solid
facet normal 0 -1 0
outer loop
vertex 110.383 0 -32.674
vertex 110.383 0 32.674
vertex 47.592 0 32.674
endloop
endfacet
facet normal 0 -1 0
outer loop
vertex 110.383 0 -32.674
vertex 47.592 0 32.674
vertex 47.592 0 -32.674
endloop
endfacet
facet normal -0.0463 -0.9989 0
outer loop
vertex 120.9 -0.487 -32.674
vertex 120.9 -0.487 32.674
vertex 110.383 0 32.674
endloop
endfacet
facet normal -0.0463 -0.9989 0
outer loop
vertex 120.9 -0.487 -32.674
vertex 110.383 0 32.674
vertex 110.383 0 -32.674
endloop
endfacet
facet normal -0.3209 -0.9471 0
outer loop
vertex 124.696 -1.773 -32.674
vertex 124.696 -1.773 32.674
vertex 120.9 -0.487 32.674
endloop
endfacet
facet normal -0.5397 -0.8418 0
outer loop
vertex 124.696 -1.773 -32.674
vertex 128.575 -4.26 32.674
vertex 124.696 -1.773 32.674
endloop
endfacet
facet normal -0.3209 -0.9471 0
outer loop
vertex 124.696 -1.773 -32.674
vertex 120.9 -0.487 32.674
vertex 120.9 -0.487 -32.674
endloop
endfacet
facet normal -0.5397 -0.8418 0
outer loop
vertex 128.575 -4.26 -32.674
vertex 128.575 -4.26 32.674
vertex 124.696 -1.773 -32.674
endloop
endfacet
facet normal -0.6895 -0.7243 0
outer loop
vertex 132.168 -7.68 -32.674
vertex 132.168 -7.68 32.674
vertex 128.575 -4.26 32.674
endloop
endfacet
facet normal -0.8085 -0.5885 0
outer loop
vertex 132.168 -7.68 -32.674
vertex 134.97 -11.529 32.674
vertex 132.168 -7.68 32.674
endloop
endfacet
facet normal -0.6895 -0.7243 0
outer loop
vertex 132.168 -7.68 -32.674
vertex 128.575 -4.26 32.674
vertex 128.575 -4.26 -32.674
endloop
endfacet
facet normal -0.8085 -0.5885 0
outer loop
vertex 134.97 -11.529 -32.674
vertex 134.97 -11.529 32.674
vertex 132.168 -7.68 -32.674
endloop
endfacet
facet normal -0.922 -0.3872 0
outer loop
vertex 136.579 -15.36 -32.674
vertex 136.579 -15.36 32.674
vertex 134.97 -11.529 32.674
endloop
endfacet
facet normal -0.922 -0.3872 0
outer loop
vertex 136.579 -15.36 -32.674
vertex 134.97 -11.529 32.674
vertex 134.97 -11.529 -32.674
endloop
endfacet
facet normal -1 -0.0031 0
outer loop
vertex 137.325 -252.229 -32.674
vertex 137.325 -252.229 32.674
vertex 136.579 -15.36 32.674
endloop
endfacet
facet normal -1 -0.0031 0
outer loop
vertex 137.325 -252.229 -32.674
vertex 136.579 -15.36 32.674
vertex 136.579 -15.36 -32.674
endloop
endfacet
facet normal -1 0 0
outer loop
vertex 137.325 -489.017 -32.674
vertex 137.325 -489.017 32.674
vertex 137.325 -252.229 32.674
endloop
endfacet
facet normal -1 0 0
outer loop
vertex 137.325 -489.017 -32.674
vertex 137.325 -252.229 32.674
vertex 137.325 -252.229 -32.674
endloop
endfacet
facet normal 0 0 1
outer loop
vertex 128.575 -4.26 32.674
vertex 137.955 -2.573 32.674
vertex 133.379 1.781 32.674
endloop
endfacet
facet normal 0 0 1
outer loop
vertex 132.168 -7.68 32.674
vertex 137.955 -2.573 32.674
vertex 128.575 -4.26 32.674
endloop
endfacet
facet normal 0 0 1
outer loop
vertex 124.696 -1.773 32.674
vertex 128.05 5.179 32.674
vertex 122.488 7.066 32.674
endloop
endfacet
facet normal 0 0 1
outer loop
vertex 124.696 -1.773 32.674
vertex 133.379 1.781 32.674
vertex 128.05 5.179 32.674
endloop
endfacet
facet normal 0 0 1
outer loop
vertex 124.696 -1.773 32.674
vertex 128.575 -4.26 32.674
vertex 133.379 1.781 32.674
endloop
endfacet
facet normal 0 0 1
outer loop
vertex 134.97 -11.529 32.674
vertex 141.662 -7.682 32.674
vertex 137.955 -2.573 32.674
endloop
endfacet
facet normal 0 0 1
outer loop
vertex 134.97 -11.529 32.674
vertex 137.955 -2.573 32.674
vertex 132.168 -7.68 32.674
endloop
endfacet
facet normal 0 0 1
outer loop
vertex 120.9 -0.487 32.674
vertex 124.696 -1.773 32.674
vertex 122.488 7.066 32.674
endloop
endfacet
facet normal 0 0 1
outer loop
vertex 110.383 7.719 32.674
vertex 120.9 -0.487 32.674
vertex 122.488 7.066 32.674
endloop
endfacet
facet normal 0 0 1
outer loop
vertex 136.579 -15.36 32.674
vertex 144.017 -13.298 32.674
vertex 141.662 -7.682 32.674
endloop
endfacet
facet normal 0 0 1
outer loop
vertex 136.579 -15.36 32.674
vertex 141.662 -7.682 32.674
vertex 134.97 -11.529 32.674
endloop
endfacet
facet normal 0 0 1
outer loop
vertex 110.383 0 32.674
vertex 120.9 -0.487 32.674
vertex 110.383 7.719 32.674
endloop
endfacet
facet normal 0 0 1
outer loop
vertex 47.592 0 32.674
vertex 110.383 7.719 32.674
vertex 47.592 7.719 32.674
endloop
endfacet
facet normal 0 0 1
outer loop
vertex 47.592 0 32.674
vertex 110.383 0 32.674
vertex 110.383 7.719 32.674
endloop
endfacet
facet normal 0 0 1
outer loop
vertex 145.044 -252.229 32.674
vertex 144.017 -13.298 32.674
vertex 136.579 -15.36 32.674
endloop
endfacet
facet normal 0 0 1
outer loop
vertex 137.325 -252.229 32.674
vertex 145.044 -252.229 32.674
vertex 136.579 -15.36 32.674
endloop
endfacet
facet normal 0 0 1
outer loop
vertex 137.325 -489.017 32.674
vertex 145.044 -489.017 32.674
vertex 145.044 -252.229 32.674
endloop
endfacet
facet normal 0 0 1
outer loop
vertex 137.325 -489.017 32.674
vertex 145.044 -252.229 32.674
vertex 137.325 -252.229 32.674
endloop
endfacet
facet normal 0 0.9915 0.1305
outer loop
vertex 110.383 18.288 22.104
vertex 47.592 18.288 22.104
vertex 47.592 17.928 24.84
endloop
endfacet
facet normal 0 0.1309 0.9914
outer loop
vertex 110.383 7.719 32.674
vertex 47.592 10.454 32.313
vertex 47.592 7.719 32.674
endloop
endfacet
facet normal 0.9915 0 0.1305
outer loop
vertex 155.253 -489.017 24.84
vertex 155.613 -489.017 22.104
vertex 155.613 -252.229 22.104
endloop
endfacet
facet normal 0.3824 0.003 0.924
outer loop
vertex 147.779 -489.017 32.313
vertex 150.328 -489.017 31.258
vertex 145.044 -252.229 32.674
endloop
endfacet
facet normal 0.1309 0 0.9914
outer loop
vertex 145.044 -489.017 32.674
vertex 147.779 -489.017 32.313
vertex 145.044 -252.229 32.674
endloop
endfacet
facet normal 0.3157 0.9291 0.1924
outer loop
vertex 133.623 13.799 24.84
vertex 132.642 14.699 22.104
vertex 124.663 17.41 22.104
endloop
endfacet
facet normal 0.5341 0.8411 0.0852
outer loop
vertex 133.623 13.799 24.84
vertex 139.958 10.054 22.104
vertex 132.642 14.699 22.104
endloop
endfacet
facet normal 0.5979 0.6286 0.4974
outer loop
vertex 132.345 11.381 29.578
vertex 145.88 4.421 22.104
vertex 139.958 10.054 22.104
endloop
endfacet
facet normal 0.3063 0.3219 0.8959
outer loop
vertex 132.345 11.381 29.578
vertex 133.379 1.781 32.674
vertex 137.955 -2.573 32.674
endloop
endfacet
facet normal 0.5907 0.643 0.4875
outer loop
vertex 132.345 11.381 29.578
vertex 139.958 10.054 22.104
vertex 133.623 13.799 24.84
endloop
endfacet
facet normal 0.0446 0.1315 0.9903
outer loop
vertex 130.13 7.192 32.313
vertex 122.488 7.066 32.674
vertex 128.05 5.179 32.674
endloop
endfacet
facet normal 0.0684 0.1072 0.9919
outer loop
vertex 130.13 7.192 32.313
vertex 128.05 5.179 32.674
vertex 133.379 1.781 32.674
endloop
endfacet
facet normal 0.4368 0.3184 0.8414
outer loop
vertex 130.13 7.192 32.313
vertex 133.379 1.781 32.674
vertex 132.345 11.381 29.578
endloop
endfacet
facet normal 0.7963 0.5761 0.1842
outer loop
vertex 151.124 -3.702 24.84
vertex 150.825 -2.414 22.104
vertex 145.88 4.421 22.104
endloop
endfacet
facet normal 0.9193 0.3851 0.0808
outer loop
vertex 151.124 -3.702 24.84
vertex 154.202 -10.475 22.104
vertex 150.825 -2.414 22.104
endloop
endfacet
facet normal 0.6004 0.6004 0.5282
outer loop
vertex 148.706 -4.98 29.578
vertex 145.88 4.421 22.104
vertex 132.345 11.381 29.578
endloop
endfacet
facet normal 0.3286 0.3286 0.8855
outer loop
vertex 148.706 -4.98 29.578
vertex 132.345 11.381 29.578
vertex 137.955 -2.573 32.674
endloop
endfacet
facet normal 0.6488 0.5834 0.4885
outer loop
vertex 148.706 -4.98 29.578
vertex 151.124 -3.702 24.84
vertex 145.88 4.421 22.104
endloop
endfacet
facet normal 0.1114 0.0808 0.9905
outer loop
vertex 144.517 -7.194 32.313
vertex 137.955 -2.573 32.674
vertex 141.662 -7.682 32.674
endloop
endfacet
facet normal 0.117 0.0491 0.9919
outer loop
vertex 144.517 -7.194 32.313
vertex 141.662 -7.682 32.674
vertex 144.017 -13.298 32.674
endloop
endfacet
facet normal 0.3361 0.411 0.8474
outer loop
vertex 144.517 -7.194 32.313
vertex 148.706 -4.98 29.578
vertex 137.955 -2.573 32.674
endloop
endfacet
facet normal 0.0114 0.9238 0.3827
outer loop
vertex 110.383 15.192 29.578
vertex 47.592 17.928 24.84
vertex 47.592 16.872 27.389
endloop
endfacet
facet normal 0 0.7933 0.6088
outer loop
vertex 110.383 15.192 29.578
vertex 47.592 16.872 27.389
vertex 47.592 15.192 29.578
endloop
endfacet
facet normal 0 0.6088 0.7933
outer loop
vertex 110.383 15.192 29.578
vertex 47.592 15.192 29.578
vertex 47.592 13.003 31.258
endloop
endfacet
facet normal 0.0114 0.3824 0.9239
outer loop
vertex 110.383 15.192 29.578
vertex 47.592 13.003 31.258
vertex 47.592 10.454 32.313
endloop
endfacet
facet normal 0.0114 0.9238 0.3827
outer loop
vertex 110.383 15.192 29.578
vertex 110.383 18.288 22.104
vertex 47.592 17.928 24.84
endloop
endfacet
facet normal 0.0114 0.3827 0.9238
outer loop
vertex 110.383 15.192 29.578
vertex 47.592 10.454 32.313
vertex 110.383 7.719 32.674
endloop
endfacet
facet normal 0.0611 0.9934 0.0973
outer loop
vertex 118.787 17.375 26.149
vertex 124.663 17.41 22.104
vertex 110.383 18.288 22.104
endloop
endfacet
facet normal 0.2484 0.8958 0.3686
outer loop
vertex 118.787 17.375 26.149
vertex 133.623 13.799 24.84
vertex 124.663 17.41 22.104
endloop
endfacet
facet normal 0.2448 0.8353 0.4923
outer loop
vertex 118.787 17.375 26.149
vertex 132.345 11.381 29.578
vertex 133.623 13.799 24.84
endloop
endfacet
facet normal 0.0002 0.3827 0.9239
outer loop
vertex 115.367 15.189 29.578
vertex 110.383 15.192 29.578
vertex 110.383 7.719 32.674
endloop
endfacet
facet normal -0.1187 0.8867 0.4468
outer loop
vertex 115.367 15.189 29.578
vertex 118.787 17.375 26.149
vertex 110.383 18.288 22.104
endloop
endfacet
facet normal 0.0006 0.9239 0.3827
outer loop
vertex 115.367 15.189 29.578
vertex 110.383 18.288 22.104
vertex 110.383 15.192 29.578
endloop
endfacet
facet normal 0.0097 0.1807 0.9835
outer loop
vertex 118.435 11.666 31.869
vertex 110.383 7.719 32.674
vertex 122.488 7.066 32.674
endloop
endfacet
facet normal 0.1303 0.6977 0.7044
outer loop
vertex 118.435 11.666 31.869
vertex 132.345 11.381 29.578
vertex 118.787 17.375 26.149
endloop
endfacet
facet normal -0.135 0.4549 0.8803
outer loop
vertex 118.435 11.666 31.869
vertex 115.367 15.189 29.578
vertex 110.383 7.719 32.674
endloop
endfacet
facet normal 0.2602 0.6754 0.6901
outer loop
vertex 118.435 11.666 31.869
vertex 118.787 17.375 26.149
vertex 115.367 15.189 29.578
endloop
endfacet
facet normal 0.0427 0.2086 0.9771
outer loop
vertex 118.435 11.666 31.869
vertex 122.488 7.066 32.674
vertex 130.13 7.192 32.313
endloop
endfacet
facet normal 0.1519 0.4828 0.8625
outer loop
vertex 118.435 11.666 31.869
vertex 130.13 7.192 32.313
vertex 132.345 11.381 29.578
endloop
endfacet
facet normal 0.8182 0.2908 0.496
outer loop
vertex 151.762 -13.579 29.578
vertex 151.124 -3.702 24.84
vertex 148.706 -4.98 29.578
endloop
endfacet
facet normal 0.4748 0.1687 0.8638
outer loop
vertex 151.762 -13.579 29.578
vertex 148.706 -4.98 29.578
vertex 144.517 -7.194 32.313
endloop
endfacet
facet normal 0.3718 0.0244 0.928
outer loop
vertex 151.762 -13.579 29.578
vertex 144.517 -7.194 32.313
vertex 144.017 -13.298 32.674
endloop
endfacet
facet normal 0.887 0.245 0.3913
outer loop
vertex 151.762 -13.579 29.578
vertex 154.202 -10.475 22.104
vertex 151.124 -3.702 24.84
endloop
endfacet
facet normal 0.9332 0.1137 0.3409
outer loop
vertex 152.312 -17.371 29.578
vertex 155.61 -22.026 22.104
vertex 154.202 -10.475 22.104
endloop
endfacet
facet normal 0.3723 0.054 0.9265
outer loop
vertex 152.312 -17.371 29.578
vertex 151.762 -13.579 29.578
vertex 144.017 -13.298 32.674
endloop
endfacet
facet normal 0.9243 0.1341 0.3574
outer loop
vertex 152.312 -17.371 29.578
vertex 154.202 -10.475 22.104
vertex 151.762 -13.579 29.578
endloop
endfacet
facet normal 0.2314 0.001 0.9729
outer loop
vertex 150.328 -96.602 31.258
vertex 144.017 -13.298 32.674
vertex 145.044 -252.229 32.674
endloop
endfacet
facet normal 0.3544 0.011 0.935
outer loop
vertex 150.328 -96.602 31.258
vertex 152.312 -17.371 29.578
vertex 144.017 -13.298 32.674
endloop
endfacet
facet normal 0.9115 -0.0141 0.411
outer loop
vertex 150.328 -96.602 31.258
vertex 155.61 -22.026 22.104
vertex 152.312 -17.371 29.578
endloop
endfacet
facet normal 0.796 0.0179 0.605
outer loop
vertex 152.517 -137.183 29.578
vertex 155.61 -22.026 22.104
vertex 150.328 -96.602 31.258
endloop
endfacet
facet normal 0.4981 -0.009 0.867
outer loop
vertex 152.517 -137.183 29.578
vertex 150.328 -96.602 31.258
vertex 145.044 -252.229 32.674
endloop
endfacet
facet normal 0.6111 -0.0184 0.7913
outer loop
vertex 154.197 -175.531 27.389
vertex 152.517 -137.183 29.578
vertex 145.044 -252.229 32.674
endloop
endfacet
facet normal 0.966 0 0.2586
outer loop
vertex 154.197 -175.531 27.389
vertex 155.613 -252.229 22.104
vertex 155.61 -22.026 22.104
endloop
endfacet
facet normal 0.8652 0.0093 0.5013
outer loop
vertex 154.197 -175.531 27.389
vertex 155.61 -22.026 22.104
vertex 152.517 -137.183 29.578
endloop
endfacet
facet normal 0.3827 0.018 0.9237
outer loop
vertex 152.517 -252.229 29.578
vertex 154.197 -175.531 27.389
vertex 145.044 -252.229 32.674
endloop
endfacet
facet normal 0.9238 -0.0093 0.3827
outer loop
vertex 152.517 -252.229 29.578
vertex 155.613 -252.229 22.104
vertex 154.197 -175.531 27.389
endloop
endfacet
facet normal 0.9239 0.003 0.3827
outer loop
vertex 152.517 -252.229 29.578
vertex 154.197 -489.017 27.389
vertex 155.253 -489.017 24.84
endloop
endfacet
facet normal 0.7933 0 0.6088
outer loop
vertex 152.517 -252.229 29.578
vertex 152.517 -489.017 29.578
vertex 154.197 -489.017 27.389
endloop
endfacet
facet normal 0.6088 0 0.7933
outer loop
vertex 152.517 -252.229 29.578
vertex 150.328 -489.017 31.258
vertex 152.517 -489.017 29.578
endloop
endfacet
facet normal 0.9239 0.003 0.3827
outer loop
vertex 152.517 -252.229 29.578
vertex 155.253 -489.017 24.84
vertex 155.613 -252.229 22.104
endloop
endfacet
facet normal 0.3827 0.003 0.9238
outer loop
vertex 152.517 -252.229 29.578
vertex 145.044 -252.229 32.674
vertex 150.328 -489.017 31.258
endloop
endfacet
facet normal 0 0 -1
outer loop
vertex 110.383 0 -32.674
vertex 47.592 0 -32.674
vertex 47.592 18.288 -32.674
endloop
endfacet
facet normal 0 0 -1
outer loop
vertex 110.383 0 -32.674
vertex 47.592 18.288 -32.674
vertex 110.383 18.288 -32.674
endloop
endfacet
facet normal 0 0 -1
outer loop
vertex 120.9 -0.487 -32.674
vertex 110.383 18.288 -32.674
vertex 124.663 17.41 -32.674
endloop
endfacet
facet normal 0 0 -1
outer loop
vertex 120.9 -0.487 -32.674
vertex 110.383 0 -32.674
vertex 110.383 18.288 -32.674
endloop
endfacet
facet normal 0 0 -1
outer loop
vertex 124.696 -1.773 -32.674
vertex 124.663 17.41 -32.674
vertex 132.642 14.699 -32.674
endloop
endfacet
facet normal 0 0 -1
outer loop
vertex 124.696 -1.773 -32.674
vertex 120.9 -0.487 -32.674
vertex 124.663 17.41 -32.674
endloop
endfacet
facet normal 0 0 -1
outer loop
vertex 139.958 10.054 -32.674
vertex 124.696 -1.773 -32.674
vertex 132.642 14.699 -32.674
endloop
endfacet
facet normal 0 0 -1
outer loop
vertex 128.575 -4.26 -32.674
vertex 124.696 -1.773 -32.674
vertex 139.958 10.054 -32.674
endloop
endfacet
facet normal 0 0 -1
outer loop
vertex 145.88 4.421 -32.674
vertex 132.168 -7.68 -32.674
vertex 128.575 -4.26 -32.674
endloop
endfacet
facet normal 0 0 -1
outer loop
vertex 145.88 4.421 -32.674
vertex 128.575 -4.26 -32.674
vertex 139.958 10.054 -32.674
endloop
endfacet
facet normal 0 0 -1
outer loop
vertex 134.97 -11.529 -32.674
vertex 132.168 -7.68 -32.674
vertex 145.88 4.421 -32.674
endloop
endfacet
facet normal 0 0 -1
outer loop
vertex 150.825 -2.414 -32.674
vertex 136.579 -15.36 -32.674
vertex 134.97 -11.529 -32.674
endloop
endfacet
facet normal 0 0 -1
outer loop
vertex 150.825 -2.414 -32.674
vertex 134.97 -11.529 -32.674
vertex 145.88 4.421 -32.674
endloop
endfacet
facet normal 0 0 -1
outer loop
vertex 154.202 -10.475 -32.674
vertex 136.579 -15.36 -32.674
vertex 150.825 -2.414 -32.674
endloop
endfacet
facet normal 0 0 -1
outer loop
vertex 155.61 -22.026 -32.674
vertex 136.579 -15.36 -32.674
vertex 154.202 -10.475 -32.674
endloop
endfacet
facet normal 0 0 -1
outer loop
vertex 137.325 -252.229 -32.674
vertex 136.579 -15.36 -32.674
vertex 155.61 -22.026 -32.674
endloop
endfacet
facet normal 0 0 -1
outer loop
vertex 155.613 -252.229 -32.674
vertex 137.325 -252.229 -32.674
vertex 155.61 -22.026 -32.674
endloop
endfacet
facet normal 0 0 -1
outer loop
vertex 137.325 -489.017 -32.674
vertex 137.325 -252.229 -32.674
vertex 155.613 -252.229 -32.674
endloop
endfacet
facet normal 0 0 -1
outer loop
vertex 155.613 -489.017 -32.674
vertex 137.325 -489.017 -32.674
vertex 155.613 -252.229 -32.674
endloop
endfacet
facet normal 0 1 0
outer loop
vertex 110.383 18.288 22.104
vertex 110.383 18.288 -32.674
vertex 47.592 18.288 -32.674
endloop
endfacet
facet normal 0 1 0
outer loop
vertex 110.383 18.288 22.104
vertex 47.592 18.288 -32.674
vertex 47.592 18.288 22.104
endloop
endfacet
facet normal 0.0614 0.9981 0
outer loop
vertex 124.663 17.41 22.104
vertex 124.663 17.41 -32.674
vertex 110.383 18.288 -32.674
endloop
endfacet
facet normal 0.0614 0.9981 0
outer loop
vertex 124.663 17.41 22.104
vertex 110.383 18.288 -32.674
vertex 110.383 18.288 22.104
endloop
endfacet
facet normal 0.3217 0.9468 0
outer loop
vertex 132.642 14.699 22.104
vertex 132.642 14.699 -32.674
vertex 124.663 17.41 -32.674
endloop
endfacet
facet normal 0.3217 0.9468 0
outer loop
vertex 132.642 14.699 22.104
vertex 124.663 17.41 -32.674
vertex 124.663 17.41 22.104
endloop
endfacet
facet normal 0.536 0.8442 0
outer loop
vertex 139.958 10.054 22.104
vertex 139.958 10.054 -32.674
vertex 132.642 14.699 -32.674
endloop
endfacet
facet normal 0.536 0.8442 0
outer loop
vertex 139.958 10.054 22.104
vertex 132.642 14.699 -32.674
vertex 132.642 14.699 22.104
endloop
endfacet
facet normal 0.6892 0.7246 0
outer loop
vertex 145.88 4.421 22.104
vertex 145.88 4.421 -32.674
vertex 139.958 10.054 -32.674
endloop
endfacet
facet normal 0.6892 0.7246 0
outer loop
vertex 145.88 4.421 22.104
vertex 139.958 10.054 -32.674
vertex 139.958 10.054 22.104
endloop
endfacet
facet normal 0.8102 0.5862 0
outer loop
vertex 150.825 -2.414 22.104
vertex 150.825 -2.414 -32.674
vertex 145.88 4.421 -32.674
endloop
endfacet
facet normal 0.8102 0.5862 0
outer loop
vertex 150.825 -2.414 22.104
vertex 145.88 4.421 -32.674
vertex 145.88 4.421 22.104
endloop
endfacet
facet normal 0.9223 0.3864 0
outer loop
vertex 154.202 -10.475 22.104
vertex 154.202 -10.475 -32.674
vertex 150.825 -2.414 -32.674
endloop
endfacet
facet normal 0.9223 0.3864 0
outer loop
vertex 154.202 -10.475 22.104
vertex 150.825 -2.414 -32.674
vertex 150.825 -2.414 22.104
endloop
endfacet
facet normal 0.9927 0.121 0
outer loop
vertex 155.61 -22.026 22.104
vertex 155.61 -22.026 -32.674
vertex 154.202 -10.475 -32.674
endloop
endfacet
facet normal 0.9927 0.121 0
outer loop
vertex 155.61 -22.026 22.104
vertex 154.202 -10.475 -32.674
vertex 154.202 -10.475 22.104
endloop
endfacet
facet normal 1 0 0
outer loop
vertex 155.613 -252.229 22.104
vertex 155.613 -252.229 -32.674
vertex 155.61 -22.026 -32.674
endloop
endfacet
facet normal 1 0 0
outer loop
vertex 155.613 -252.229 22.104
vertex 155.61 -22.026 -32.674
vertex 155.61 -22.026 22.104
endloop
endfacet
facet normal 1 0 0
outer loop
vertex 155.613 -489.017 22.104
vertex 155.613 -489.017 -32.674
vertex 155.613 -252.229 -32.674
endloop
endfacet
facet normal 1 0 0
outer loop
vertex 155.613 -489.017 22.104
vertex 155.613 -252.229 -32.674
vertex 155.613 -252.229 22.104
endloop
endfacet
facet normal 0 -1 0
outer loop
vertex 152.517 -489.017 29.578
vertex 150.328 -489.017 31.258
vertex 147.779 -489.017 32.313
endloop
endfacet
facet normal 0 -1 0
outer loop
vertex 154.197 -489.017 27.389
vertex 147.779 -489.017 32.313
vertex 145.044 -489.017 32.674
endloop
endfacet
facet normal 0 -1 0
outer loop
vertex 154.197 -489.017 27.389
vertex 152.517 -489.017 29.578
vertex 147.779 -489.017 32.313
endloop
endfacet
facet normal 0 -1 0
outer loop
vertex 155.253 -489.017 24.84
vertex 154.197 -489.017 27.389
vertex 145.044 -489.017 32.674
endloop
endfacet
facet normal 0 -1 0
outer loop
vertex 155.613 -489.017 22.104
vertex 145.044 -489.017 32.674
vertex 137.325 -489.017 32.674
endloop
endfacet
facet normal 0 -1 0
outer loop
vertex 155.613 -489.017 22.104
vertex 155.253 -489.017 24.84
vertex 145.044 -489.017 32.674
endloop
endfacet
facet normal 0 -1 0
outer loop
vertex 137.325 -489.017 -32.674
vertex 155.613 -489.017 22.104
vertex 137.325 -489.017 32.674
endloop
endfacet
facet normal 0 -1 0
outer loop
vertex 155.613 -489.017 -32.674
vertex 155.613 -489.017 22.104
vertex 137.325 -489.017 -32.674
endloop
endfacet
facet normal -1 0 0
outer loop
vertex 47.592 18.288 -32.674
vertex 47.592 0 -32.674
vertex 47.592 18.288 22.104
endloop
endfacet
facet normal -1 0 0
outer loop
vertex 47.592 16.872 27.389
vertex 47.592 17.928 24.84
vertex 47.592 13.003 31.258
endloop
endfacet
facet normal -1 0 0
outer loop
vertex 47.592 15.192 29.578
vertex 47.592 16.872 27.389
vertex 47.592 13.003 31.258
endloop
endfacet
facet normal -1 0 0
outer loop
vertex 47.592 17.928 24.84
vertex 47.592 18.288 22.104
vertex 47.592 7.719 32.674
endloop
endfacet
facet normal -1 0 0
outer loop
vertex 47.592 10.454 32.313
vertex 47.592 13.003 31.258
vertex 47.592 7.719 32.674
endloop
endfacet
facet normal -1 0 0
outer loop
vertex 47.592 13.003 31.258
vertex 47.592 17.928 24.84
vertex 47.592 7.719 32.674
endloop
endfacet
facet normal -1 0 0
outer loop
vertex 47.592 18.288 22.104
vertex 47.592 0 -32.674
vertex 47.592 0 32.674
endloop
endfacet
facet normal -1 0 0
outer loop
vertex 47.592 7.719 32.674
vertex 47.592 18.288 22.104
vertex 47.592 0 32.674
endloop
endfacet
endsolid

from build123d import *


with BuildPart() as part:
    # Sweep1: sweep along a path in Sketch4
    with BuildLine() as sweep1_path:  # in the path sketch's own coordinates; laid on its plane below (add() does not lay a ready-made edge on the line's plane)
        add(Edge.make_bspline(
            [(47.591788131, 0), (69.745218369, 0), (91.898648606, 0), (114.052078844, 0), (117.709028489, 0), (125.022927778, 0), (137.324763875, -12.301836097), (137.324763875, -19.615735386), (137.324763875, -23.272685031), (137.324763875, -178.520736688), (137.324763875, -333.768788344), (137.324763875, -489.01684)],
            knots=[0, 0, 0, 0, 0.117604481, 0.117604481, 0.117604481, 0.137017893, 0.156431305, 0.175844717, 0.175844717, 0.175844717, 1, 1, 1, 1], degree=3))
    # Sketch5 → Sweep1 (sweep)
    with BuildSketch(Plane(origin=(47.591788131, 0, 0), x_dir=(0, 0, -1), z_dir=(1, 0, 0))):
        with BuildLine():
            Line((-32.673593006, 0), (32.673593006, 0))
            Line((32.673593006, 0), (32.673593006, 18.288))
            Line((32.673593006, 18.288), (-22.104374823, 18.288))
            ThreePointArc((-22.104374823, 18.288), (-29.577940672, 15.192347666), (-32.673593006, 7.718781817))
            Line((-32.673593006, 7.718781817), (-32.673593006, 0))
        make_face()
    sweep(path=Plane.XY.offset(32.673593006) * sweep1_path.line)


solid = part.part
